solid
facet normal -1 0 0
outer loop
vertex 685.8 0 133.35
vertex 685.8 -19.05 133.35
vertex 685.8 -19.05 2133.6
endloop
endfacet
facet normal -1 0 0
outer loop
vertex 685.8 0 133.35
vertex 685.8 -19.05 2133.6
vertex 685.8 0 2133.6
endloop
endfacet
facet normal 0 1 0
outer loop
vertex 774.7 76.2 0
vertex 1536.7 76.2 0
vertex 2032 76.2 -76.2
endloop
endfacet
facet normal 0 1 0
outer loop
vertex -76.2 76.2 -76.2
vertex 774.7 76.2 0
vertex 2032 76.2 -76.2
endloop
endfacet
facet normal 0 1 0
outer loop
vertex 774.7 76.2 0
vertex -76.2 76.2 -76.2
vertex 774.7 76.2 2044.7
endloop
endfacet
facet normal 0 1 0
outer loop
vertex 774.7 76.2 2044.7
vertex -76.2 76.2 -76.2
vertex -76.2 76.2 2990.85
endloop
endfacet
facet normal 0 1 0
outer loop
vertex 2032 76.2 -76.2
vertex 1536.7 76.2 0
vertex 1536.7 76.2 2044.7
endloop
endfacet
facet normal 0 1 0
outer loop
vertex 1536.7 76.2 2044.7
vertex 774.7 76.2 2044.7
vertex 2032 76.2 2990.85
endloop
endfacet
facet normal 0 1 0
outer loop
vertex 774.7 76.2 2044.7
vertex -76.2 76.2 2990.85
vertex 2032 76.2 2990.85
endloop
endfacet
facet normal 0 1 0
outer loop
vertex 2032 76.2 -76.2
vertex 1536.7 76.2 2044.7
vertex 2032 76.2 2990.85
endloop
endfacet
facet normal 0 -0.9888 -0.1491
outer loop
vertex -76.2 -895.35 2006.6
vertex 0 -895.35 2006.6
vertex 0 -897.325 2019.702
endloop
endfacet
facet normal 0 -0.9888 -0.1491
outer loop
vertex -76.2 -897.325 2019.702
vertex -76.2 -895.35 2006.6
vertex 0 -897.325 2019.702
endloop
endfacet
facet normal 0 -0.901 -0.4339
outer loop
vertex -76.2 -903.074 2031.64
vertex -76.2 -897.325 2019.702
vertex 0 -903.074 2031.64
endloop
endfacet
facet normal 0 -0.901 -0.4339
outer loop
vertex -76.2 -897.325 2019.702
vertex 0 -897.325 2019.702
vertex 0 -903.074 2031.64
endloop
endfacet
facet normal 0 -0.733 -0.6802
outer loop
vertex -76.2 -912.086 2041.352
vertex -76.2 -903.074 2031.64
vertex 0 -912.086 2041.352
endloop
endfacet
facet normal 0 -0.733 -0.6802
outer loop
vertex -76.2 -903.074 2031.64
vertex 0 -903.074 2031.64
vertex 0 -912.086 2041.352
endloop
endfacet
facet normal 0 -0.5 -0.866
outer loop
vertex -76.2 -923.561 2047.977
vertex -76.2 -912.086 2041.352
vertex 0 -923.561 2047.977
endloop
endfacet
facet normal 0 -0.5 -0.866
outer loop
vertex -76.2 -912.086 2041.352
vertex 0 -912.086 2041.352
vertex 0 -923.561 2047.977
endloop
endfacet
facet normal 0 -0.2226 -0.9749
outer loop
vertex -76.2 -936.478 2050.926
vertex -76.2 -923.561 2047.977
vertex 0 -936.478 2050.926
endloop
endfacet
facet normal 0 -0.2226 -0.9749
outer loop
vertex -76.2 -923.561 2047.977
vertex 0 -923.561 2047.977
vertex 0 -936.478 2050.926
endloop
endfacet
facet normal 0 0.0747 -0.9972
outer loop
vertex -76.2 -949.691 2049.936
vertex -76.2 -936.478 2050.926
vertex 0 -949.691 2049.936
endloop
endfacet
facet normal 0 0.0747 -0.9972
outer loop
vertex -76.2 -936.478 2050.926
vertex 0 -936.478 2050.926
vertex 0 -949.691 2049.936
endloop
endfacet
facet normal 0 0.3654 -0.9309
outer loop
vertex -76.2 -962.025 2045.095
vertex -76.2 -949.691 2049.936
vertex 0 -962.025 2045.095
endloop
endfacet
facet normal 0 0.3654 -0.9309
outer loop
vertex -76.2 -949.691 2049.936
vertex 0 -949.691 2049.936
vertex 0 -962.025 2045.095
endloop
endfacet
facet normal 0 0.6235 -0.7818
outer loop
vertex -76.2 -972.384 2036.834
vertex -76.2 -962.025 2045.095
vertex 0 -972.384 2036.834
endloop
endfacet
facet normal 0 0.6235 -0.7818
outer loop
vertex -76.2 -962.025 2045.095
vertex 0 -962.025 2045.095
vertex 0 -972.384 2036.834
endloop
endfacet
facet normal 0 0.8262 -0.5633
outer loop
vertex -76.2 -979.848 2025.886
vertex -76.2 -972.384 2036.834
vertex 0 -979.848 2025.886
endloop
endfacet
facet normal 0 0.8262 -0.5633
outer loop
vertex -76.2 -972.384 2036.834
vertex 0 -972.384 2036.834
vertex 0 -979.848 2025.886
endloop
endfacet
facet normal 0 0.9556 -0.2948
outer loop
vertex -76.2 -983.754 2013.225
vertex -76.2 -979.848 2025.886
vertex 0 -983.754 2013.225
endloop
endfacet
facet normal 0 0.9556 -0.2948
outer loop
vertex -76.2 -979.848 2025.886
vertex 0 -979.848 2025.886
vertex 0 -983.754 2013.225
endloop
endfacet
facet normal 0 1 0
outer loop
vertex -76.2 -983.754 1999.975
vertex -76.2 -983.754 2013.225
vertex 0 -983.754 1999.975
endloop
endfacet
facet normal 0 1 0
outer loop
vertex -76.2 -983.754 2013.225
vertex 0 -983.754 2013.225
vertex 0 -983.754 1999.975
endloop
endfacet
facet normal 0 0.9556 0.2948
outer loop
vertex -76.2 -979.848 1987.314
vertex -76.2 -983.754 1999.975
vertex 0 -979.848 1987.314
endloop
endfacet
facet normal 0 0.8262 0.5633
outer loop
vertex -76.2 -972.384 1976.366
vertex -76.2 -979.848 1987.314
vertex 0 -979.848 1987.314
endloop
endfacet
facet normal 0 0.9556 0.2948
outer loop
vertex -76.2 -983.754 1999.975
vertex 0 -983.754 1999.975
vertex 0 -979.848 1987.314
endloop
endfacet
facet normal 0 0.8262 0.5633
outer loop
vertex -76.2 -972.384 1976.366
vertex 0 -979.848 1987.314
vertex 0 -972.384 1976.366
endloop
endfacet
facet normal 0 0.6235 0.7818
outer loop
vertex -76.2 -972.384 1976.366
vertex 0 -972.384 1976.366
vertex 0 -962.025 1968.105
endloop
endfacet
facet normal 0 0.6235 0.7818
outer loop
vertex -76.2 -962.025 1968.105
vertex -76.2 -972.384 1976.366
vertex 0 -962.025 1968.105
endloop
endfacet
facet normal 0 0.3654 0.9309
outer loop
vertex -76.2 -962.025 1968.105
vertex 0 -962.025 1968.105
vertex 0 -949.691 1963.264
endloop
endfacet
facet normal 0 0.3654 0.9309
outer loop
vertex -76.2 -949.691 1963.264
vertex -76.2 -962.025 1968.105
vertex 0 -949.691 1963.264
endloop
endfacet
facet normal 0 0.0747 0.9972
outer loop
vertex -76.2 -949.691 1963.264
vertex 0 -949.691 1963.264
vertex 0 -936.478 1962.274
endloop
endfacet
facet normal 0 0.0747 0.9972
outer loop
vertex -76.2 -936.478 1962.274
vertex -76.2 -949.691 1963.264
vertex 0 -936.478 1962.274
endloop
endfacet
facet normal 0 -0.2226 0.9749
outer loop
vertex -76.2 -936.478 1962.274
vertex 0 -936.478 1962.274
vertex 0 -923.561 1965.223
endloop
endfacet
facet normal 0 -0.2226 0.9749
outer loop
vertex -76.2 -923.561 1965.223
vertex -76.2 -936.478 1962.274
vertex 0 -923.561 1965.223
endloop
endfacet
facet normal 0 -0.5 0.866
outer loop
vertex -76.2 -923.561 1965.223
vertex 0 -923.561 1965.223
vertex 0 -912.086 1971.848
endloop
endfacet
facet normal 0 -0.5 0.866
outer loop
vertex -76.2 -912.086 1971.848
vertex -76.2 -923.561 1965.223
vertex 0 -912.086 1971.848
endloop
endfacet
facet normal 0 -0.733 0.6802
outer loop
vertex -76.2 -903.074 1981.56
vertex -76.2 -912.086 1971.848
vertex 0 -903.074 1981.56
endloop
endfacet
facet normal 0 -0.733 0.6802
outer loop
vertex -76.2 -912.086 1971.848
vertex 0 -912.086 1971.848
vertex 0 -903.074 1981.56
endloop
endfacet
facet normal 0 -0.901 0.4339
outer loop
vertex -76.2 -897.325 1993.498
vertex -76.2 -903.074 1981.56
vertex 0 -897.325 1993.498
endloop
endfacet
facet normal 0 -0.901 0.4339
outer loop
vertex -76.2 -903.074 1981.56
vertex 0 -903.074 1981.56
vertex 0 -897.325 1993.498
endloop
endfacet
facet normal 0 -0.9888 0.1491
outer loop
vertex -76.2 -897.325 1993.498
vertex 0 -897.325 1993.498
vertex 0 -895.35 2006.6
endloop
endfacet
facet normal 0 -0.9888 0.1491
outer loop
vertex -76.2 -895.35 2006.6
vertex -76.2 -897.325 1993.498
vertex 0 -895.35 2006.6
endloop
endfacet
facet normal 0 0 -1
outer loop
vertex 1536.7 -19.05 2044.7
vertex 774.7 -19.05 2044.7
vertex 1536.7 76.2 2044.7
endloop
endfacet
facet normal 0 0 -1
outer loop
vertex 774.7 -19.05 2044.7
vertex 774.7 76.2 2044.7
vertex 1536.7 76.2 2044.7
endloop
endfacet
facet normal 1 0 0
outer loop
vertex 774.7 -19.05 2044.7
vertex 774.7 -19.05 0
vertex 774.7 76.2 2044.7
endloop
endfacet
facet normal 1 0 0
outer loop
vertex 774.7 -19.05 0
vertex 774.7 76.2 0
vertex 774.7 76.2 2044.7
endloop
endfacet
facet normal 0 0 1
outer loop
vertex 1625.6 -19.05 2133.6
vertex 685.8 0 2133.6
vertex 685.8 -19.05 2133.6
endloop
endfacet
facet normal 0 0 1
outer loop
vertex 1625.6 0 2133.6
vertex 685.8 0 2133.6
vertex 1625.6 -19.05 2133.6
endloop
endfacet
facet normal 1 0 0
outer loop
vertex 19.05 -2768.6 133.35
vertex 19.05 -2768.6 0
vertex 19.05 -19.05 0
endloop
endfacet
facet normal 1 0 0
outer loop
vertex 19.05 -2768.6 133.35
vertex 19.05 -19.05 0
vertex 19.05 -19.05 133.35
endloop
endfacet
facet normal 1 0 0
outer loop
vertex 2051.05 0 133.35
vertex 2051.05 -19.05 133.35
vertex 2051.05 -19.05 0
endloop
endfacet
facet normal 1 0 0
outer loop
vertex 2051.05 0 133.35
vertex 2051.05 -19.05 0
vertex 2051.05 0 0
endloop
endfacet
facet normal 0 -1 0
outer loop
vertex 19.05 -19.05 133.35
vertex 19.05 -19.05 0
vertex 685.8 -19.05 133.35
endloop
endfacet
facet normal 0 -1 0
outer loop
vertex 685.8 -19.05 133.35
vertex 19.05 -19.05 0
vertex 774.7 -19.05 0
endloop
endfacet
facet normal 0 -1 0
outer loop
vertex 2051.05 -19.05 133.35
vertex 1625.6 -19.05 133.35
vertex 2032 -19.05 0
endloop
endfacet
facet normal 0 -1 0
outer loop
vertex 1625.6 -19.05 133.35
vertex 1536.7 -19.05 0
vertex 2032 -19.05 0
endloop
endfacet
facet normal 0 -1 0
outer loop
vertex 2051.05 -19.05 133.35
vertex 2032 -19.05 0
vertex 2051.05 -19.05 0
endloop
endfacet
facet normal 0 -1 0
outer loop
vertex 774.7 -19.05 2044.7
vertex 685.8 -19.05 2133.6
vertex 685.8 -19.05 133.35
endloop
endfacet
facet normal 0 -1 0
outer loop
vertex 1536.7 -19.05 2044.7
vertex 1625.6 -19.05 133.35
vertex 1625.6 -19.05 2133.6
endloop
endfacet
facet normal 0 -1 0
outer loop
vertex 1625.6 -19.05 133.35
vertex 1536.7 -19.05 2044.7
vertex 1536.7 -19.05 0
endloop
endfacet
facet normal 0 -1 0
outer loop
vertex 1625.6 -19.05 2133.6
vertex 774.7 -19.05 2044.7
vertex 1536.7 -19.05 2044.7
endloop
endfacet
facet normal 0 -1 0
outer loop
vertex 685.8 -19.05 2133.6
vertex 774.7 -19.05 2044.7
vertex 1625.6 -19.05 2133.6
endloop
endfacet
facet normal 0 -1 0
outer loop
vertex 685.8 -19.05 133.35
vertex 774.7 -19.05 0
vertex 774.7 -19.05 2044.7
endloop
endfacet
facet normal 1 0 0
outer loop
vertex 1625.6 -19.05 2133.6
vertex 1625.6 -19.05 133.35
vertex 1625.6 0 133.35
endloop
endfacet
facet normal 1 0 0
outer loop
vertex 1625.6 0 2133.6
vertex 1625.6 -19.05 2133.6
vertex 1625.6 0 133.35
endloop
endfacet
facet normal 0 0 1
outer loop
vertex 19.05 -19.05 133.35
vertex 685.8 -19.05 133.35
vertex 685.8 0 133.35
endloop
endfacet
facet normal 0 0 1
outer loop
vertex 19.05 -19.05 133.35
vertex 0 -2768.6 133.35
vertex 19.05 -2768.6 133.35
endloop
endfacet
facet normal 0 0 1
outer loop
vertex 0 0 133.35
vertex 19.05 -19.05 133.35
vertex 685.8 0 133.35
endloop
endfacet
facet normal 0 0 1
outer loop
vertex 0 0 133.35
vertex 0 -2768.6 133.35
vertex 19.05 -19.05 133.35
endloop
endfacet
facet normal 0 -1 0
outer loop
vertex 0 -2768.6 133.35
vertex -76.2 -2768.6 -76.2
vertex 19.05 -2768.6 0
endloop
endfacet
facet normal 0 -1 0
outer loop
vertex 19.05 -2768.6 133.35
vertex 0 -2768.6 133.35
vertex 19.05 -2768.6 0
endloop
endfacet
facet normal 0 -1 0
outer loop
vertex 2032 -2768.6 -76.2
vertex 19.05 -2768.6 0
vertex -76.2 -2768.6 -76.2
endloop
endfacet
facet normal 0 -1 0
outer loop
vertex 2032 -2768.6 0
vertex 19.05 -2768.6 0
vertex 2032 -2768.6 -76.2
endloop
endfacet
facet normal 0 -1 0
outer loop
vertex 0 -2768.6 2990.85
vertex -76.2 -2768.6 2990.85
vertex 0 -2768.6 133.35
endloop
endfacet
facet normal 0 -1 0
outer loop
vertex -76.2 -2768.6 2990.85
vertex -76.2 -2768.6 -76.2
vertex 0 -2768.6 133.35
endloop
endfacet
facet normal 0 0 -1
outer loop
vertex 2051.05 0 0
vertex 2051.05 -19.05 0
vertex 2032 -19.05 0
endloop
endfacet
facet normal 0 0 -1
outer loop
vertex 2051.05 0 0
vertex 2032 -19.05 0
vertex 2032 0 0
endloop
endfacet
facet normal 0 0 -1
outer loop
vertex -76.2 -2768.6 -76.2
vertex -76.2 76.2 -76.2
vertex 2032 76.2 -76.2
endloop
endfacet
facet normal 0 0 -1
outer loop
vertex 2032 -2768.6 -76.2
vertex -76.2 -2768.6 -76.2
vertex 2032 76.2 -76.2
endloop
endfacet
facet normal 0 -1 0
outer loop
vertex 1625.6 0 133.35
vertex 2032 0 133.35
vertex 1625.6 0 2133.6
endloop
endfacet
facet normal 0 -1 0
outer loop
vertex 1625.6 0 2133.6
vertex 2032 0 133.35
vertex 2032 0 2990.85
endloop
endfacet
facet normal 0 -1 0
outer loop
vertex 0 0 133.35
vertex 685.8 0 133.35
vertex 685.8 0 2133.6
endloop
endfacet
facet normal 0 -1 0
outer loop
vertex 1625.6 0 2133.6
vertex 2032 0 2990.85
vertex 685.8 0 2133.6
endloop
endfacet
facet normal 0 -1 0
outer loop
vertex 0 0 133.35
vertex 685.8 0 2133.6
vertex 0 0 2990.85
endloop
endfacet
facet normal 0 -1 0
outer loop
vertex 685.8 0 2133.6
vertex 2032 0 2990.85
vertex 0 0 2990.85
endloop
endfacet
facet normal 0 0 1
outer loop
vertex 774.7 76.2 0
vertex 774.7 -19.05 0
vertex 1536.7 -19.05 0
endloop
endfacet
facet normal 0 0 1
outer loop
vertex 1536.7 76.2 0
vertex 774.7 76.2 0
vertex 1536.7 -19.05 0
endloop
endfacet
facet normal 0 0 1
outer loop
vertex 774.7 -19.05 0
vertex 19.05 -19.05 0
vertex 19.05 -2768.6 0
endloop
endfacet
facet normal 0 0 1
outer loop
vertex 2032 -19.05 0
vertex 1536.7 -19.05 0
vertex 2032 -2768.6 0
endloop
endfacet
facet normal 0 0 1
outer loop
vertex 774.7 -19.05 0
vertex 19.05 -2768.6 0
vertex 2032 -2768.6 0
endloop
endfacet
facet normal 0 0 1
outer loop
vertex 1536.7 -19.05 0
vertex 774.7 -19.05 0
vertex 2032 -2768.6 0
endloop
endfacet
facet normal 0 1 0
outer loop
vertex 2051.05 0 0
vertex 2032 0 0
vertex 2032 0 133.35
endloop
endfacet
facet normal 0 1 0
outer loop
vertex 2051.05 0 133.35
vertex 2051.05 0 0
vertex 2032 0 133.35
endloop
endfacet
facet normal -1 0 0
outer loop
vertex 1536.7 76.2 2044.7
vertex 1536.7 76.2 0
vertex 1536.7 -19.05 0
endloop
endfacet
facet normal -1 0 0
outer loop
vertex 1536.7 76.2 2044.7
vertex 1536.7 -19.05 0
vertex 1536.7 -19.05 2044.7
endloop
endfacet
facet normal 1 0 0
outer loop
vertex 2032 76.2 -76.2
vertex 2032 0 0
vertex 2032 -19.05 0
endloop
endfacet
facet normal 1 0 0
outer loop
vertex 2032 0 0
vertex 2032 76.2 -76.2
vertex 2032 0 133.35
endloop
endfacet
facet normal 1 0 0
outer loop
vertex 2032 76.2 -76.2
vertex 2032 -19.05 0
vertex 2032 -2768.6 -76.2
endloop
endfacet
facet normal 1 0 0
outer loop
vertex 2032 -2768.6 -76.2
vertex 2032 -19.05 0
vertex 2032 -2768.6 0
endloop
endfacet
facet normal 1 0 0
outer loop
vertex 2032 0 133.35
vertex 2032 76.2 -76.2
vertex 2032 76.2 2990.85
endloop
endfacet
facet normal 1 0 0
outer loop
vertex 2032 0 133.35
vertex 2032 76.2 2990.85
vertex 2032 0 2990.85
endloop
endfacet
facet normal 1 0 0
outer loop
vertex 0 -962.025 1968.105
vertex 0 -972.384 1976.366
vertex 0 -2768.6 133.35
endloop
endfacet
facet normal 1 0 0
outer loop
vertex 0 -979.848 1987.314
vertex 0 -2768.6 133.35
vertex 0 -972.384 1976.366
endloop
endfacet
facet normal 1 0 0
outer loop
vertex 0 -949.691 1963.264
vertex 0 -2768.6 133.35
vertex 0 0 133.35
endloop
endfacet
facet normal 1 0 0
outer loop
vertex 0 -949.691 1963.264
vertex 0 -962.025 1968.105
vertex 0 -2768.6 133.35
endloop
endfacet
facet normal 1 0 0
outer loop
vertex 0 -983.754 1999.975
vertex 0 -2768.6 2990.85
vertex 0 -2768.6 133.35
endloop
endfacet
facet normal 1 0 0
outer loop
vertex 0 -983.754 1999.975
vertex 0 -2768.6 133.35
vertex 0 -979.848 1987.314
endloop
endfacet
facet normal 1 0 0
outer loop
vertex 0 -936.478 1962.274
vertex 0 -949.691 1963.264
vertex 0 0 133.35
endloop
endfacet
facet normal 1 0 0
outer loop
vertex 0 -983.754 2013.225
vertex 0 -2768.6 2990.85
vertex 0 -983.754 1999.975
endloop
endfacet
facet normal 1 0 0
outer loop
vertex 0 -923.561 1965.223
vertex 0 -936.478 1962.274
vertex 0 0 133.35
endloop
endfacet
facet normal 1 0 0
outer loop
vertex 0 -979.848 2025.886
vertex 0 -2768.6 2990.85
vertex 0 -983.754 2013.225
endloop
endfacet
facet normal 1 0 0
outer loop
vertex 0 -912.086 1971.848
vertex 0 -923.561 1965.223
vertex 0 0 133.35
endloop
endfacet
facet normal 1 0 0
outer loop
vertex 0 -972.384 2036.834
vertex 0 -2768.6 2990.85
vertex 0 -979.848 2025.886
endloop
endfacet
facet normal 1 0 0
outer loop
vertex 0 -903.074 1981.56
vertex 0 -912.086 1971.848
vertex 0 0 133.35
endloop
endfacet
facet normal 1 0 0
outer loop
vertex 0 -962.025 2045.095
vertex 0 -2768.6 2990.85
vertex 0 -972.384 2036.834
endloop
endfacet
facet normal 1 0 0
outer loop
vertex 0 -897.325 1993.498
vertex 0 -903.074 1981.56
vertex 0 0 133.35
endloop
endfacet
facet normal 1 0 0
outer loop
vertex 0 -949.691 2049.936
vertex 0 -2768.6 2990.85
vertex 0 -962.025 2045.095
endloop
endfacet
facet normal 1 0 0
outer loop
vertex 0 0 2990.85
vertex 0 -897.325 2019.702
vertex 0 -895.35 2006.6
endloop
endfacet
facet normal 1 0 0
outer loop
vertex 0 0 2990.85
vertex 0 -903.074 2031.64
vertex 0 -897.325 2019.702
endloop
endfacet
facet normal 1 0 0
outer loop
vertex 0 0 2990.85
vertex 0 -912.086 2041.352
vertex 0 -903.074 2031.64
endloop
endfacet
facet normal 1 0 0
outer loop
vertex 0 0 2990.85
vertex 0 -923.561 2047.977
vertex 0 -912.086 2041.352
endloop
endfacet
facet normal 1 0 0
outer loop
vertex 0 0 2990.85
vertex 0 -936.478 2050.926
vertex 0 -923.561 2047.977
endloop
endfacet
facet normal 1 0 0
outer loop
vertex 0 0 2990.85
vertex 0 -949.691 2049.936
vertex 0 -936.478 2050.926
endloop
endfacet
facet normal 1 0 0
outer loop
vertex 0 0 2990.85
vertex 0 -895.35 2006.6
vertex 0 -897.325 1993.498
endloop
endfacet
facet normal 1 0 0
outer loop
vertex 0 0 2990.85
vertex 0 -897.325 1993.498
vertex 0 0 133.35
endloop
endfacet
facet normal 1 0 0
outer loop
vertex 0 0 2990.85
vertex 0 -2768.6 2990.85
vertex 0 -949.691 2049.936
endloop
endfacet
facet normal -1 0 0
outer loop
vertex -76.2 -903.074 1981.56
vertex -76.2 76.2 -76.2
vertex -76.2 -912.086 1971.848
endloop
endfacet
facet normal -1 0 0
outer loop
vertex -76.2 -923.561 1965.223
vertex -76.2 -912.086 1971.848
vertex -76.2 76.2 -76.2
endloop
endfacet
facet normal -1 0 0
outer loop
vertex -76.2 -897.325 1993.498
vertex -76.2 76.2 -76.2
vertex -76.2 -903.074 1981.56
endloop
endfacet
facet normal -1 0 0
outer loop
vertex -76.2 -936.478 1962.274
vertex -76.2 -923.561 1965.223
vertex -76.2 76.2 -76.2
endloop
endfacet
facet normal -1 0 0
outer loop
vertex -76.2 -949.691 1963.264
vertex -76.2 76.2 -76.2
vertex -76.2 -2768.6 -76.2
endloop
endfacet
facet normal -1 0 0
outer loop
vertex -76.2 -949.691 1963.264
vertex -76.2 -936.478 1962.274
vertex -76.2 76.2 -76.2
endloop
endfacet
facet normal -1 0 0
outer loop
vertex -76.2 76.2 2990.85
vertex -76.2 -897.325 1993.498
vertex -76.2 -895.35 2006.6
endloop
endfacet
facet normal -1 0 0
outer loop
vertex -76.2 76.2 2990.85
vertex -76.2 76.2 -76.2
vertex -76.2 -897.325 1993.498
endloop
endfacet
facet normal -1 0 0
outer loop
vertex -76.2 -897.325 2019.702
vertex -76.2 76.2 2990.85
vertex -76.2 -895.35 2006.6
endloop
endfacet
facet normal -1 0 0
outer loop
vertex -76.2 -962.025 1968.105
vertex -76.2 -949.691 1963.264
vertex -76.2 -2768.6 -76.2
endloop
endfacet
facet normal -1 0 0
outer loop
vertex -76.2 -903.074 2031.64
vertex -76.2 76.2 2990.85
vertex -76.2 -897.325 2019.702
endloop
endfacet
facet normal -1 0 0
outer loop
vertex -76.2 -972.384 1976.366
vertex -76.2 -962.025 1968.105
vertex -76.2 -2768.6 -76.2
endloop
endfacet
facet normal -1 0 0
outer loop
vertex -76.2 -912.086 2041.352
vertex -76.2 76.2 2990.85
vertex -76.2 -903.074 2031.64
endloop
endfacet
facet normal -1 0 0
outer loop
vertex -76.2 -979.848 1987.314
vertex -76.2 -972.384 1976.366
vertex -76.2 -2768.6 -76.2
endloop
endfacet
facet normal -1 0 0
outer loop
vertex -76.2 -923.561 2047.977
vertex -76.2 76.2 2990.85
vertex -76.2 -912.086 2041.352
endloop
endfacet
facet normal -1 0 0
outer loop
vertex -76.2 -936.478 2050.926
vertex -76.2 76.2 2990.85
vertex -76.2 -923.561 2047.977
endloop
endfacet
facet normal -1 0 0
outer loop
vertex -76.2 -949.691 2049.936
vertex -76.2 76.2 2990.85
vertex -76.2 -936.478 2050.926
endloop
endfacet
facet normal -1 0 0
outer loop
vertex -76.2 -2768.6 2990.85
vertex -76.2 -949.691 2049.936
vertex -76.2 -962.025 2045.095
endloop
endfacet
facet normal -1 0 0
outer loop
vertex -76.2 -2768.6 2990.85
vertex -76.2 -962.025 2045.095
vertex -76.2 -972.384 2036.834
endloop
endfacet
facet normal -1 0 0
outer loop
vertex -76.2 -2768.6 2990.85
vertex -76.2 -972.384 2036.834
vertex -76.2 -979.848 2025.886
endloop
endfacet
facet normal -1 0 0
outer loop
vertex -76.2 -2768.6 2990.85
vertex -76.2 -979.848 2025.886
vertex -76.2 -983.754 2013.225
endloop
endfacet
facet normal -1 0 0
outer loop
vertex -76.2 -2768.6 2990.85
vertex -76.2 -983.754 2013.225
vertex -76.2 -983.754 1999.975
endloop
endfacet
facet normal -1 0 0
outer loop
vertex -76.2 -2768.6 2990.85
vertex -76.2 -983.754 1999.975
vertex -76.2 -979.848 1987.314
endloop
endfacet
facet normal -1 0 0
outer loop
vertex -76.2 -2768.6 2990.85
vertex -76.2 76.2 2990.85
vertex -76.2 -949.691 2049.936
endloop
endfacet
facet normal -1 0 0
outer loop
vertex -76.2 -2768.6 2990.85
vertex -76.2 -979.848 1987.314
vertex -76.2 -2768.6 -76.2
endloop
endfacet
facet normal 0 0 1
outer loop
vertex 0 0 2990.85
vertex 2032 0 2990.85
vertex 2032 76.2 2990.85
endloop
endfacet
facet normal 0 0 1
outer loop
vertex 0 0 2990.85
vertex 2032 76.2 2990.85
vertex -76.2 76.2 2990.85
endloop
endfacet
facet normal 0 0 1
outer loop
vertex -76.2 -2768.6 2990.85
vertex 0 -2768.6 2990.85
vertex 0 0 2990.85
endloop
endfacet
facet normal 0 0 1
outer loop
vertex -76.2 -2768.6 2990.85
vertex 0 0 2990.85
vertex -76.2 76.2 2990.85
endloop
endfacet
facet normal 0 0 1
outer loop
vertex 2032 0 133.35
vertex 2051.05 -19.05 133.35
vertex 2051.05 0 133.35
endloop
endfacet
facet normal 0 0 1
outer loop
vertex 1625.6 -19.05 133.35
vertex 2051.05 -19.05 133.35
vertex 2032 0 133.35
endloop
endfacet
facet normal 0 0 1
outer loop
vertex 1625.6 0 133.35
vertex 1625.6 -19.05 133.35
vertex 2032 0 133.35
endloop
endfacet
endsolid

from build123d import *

# Parameters (mm, degrees)
F0_W      = 2768.6
F0_H      = 2990.85
F1_DEPTH  = 76.2
F2_W      = 2108.2
F2_H      = 2990.85
F3_DEPTH  = 76.2
F4_W      = 2108.2
F4_H      = 2844.8
F5_DEPTH  = 76.2
F6_W      = 762
F6_H      = 2044.7
F7_DEPTH  = 76.2
F8_W      = 19.05
F8_H      = 133.35
F9_DEPTH  = 2768.6
F10_W     = 19.05
F10_H     = 133.35
F11_DEPTH = 2032
F12_W     = 939.8
F12_H     = 19.05
F13_DEPTH = 2000.25
F14_DEPTH = 19.05
F15_R     = 44.45
F16_DEPTH = 76.2


with BuildPart() as f1:
    # F0 (on Right) → F1 (new body)
    with BuildSketch(Plane.YZ):
        with Locations((-1384.3, 1495.425)):
            Rectangle(F0_W, F0_H)
    extrude(amount=-F1_DEPTH)

    # F2 (on face) → F3 (join)
    with BuildSketch(Plane(origin=(0, 0, 0), x_dir=(-1, 0, 0), z_dir=(0, 1, 0))):
        with Locations((-977.9, 1495.425)):
            Rectangle(F2_W, F2_H)
    extrude(amount=F3_DEPTH)

    # F4 (on face) → F5 (join)
    with BuildSketch(Plane(origin=(0, 0, 0), x_dir=(1, 0, 0), z_dir=(0, 0, -1))):
        with Locations((977.9, 1346.2)):
            Rectangle(F4_W, F4_H)
    extrude(amount=F5_DEPTH)

    # F6 (on face) → F7 (cut)
    with BuildSketch(Plane.XZ):
        with Locations((1155.7, 1022.35)):
            Rectangle(F6_W, F6_H)
    extrude(amount=-F7_DEPTH, mode=Mode.SUBTRACT)

    # F8 (on face) → F9 (join)
    with BuildSketch(Plane.XZ.offset(2768.6)):
        with Locations((9.525, 66.675)):
            Rectangle(F8_W, F8_H)
    extrude(amount=-F9_DEPTH)

    # F10 (on face) → F11 (join)
    with BuildSketch(Plane.YZ.offset(19.05)):
        with Locations((-9.525, 66.675)):
            Rectangle(F10_W, F10_H)
    extrude(amount=F11_DEPTH)

    # F12 (on face) → F13 (join)
    with BuildSketch(Plane.XY.offset(133.35)):
        with Locations((1155.7, -9.525)):
            Rectangle(F12_W, F12_H)
    extrude(amount=F13_DEPTH)

    # F6 (on face) → F14 (cut)
    with BuildSketch(Plane.XZ):
        with Locations((1155.7, 1022.35)):
            Rectangle(F6_W, F6_H)
    extrude(amount=F14_DEPTH, mode=Mode.SUBTRACT)

    # F15 (on face) → F16 (cut)
    with BuildSketch(Plane.YZ):
        with Locations((-939.8, 2006.6)):
            Circle(F15_R)
    extrude(amount=-F16_DEPTH, mode=Mode.SUBTRACT)


solid = f1.part
